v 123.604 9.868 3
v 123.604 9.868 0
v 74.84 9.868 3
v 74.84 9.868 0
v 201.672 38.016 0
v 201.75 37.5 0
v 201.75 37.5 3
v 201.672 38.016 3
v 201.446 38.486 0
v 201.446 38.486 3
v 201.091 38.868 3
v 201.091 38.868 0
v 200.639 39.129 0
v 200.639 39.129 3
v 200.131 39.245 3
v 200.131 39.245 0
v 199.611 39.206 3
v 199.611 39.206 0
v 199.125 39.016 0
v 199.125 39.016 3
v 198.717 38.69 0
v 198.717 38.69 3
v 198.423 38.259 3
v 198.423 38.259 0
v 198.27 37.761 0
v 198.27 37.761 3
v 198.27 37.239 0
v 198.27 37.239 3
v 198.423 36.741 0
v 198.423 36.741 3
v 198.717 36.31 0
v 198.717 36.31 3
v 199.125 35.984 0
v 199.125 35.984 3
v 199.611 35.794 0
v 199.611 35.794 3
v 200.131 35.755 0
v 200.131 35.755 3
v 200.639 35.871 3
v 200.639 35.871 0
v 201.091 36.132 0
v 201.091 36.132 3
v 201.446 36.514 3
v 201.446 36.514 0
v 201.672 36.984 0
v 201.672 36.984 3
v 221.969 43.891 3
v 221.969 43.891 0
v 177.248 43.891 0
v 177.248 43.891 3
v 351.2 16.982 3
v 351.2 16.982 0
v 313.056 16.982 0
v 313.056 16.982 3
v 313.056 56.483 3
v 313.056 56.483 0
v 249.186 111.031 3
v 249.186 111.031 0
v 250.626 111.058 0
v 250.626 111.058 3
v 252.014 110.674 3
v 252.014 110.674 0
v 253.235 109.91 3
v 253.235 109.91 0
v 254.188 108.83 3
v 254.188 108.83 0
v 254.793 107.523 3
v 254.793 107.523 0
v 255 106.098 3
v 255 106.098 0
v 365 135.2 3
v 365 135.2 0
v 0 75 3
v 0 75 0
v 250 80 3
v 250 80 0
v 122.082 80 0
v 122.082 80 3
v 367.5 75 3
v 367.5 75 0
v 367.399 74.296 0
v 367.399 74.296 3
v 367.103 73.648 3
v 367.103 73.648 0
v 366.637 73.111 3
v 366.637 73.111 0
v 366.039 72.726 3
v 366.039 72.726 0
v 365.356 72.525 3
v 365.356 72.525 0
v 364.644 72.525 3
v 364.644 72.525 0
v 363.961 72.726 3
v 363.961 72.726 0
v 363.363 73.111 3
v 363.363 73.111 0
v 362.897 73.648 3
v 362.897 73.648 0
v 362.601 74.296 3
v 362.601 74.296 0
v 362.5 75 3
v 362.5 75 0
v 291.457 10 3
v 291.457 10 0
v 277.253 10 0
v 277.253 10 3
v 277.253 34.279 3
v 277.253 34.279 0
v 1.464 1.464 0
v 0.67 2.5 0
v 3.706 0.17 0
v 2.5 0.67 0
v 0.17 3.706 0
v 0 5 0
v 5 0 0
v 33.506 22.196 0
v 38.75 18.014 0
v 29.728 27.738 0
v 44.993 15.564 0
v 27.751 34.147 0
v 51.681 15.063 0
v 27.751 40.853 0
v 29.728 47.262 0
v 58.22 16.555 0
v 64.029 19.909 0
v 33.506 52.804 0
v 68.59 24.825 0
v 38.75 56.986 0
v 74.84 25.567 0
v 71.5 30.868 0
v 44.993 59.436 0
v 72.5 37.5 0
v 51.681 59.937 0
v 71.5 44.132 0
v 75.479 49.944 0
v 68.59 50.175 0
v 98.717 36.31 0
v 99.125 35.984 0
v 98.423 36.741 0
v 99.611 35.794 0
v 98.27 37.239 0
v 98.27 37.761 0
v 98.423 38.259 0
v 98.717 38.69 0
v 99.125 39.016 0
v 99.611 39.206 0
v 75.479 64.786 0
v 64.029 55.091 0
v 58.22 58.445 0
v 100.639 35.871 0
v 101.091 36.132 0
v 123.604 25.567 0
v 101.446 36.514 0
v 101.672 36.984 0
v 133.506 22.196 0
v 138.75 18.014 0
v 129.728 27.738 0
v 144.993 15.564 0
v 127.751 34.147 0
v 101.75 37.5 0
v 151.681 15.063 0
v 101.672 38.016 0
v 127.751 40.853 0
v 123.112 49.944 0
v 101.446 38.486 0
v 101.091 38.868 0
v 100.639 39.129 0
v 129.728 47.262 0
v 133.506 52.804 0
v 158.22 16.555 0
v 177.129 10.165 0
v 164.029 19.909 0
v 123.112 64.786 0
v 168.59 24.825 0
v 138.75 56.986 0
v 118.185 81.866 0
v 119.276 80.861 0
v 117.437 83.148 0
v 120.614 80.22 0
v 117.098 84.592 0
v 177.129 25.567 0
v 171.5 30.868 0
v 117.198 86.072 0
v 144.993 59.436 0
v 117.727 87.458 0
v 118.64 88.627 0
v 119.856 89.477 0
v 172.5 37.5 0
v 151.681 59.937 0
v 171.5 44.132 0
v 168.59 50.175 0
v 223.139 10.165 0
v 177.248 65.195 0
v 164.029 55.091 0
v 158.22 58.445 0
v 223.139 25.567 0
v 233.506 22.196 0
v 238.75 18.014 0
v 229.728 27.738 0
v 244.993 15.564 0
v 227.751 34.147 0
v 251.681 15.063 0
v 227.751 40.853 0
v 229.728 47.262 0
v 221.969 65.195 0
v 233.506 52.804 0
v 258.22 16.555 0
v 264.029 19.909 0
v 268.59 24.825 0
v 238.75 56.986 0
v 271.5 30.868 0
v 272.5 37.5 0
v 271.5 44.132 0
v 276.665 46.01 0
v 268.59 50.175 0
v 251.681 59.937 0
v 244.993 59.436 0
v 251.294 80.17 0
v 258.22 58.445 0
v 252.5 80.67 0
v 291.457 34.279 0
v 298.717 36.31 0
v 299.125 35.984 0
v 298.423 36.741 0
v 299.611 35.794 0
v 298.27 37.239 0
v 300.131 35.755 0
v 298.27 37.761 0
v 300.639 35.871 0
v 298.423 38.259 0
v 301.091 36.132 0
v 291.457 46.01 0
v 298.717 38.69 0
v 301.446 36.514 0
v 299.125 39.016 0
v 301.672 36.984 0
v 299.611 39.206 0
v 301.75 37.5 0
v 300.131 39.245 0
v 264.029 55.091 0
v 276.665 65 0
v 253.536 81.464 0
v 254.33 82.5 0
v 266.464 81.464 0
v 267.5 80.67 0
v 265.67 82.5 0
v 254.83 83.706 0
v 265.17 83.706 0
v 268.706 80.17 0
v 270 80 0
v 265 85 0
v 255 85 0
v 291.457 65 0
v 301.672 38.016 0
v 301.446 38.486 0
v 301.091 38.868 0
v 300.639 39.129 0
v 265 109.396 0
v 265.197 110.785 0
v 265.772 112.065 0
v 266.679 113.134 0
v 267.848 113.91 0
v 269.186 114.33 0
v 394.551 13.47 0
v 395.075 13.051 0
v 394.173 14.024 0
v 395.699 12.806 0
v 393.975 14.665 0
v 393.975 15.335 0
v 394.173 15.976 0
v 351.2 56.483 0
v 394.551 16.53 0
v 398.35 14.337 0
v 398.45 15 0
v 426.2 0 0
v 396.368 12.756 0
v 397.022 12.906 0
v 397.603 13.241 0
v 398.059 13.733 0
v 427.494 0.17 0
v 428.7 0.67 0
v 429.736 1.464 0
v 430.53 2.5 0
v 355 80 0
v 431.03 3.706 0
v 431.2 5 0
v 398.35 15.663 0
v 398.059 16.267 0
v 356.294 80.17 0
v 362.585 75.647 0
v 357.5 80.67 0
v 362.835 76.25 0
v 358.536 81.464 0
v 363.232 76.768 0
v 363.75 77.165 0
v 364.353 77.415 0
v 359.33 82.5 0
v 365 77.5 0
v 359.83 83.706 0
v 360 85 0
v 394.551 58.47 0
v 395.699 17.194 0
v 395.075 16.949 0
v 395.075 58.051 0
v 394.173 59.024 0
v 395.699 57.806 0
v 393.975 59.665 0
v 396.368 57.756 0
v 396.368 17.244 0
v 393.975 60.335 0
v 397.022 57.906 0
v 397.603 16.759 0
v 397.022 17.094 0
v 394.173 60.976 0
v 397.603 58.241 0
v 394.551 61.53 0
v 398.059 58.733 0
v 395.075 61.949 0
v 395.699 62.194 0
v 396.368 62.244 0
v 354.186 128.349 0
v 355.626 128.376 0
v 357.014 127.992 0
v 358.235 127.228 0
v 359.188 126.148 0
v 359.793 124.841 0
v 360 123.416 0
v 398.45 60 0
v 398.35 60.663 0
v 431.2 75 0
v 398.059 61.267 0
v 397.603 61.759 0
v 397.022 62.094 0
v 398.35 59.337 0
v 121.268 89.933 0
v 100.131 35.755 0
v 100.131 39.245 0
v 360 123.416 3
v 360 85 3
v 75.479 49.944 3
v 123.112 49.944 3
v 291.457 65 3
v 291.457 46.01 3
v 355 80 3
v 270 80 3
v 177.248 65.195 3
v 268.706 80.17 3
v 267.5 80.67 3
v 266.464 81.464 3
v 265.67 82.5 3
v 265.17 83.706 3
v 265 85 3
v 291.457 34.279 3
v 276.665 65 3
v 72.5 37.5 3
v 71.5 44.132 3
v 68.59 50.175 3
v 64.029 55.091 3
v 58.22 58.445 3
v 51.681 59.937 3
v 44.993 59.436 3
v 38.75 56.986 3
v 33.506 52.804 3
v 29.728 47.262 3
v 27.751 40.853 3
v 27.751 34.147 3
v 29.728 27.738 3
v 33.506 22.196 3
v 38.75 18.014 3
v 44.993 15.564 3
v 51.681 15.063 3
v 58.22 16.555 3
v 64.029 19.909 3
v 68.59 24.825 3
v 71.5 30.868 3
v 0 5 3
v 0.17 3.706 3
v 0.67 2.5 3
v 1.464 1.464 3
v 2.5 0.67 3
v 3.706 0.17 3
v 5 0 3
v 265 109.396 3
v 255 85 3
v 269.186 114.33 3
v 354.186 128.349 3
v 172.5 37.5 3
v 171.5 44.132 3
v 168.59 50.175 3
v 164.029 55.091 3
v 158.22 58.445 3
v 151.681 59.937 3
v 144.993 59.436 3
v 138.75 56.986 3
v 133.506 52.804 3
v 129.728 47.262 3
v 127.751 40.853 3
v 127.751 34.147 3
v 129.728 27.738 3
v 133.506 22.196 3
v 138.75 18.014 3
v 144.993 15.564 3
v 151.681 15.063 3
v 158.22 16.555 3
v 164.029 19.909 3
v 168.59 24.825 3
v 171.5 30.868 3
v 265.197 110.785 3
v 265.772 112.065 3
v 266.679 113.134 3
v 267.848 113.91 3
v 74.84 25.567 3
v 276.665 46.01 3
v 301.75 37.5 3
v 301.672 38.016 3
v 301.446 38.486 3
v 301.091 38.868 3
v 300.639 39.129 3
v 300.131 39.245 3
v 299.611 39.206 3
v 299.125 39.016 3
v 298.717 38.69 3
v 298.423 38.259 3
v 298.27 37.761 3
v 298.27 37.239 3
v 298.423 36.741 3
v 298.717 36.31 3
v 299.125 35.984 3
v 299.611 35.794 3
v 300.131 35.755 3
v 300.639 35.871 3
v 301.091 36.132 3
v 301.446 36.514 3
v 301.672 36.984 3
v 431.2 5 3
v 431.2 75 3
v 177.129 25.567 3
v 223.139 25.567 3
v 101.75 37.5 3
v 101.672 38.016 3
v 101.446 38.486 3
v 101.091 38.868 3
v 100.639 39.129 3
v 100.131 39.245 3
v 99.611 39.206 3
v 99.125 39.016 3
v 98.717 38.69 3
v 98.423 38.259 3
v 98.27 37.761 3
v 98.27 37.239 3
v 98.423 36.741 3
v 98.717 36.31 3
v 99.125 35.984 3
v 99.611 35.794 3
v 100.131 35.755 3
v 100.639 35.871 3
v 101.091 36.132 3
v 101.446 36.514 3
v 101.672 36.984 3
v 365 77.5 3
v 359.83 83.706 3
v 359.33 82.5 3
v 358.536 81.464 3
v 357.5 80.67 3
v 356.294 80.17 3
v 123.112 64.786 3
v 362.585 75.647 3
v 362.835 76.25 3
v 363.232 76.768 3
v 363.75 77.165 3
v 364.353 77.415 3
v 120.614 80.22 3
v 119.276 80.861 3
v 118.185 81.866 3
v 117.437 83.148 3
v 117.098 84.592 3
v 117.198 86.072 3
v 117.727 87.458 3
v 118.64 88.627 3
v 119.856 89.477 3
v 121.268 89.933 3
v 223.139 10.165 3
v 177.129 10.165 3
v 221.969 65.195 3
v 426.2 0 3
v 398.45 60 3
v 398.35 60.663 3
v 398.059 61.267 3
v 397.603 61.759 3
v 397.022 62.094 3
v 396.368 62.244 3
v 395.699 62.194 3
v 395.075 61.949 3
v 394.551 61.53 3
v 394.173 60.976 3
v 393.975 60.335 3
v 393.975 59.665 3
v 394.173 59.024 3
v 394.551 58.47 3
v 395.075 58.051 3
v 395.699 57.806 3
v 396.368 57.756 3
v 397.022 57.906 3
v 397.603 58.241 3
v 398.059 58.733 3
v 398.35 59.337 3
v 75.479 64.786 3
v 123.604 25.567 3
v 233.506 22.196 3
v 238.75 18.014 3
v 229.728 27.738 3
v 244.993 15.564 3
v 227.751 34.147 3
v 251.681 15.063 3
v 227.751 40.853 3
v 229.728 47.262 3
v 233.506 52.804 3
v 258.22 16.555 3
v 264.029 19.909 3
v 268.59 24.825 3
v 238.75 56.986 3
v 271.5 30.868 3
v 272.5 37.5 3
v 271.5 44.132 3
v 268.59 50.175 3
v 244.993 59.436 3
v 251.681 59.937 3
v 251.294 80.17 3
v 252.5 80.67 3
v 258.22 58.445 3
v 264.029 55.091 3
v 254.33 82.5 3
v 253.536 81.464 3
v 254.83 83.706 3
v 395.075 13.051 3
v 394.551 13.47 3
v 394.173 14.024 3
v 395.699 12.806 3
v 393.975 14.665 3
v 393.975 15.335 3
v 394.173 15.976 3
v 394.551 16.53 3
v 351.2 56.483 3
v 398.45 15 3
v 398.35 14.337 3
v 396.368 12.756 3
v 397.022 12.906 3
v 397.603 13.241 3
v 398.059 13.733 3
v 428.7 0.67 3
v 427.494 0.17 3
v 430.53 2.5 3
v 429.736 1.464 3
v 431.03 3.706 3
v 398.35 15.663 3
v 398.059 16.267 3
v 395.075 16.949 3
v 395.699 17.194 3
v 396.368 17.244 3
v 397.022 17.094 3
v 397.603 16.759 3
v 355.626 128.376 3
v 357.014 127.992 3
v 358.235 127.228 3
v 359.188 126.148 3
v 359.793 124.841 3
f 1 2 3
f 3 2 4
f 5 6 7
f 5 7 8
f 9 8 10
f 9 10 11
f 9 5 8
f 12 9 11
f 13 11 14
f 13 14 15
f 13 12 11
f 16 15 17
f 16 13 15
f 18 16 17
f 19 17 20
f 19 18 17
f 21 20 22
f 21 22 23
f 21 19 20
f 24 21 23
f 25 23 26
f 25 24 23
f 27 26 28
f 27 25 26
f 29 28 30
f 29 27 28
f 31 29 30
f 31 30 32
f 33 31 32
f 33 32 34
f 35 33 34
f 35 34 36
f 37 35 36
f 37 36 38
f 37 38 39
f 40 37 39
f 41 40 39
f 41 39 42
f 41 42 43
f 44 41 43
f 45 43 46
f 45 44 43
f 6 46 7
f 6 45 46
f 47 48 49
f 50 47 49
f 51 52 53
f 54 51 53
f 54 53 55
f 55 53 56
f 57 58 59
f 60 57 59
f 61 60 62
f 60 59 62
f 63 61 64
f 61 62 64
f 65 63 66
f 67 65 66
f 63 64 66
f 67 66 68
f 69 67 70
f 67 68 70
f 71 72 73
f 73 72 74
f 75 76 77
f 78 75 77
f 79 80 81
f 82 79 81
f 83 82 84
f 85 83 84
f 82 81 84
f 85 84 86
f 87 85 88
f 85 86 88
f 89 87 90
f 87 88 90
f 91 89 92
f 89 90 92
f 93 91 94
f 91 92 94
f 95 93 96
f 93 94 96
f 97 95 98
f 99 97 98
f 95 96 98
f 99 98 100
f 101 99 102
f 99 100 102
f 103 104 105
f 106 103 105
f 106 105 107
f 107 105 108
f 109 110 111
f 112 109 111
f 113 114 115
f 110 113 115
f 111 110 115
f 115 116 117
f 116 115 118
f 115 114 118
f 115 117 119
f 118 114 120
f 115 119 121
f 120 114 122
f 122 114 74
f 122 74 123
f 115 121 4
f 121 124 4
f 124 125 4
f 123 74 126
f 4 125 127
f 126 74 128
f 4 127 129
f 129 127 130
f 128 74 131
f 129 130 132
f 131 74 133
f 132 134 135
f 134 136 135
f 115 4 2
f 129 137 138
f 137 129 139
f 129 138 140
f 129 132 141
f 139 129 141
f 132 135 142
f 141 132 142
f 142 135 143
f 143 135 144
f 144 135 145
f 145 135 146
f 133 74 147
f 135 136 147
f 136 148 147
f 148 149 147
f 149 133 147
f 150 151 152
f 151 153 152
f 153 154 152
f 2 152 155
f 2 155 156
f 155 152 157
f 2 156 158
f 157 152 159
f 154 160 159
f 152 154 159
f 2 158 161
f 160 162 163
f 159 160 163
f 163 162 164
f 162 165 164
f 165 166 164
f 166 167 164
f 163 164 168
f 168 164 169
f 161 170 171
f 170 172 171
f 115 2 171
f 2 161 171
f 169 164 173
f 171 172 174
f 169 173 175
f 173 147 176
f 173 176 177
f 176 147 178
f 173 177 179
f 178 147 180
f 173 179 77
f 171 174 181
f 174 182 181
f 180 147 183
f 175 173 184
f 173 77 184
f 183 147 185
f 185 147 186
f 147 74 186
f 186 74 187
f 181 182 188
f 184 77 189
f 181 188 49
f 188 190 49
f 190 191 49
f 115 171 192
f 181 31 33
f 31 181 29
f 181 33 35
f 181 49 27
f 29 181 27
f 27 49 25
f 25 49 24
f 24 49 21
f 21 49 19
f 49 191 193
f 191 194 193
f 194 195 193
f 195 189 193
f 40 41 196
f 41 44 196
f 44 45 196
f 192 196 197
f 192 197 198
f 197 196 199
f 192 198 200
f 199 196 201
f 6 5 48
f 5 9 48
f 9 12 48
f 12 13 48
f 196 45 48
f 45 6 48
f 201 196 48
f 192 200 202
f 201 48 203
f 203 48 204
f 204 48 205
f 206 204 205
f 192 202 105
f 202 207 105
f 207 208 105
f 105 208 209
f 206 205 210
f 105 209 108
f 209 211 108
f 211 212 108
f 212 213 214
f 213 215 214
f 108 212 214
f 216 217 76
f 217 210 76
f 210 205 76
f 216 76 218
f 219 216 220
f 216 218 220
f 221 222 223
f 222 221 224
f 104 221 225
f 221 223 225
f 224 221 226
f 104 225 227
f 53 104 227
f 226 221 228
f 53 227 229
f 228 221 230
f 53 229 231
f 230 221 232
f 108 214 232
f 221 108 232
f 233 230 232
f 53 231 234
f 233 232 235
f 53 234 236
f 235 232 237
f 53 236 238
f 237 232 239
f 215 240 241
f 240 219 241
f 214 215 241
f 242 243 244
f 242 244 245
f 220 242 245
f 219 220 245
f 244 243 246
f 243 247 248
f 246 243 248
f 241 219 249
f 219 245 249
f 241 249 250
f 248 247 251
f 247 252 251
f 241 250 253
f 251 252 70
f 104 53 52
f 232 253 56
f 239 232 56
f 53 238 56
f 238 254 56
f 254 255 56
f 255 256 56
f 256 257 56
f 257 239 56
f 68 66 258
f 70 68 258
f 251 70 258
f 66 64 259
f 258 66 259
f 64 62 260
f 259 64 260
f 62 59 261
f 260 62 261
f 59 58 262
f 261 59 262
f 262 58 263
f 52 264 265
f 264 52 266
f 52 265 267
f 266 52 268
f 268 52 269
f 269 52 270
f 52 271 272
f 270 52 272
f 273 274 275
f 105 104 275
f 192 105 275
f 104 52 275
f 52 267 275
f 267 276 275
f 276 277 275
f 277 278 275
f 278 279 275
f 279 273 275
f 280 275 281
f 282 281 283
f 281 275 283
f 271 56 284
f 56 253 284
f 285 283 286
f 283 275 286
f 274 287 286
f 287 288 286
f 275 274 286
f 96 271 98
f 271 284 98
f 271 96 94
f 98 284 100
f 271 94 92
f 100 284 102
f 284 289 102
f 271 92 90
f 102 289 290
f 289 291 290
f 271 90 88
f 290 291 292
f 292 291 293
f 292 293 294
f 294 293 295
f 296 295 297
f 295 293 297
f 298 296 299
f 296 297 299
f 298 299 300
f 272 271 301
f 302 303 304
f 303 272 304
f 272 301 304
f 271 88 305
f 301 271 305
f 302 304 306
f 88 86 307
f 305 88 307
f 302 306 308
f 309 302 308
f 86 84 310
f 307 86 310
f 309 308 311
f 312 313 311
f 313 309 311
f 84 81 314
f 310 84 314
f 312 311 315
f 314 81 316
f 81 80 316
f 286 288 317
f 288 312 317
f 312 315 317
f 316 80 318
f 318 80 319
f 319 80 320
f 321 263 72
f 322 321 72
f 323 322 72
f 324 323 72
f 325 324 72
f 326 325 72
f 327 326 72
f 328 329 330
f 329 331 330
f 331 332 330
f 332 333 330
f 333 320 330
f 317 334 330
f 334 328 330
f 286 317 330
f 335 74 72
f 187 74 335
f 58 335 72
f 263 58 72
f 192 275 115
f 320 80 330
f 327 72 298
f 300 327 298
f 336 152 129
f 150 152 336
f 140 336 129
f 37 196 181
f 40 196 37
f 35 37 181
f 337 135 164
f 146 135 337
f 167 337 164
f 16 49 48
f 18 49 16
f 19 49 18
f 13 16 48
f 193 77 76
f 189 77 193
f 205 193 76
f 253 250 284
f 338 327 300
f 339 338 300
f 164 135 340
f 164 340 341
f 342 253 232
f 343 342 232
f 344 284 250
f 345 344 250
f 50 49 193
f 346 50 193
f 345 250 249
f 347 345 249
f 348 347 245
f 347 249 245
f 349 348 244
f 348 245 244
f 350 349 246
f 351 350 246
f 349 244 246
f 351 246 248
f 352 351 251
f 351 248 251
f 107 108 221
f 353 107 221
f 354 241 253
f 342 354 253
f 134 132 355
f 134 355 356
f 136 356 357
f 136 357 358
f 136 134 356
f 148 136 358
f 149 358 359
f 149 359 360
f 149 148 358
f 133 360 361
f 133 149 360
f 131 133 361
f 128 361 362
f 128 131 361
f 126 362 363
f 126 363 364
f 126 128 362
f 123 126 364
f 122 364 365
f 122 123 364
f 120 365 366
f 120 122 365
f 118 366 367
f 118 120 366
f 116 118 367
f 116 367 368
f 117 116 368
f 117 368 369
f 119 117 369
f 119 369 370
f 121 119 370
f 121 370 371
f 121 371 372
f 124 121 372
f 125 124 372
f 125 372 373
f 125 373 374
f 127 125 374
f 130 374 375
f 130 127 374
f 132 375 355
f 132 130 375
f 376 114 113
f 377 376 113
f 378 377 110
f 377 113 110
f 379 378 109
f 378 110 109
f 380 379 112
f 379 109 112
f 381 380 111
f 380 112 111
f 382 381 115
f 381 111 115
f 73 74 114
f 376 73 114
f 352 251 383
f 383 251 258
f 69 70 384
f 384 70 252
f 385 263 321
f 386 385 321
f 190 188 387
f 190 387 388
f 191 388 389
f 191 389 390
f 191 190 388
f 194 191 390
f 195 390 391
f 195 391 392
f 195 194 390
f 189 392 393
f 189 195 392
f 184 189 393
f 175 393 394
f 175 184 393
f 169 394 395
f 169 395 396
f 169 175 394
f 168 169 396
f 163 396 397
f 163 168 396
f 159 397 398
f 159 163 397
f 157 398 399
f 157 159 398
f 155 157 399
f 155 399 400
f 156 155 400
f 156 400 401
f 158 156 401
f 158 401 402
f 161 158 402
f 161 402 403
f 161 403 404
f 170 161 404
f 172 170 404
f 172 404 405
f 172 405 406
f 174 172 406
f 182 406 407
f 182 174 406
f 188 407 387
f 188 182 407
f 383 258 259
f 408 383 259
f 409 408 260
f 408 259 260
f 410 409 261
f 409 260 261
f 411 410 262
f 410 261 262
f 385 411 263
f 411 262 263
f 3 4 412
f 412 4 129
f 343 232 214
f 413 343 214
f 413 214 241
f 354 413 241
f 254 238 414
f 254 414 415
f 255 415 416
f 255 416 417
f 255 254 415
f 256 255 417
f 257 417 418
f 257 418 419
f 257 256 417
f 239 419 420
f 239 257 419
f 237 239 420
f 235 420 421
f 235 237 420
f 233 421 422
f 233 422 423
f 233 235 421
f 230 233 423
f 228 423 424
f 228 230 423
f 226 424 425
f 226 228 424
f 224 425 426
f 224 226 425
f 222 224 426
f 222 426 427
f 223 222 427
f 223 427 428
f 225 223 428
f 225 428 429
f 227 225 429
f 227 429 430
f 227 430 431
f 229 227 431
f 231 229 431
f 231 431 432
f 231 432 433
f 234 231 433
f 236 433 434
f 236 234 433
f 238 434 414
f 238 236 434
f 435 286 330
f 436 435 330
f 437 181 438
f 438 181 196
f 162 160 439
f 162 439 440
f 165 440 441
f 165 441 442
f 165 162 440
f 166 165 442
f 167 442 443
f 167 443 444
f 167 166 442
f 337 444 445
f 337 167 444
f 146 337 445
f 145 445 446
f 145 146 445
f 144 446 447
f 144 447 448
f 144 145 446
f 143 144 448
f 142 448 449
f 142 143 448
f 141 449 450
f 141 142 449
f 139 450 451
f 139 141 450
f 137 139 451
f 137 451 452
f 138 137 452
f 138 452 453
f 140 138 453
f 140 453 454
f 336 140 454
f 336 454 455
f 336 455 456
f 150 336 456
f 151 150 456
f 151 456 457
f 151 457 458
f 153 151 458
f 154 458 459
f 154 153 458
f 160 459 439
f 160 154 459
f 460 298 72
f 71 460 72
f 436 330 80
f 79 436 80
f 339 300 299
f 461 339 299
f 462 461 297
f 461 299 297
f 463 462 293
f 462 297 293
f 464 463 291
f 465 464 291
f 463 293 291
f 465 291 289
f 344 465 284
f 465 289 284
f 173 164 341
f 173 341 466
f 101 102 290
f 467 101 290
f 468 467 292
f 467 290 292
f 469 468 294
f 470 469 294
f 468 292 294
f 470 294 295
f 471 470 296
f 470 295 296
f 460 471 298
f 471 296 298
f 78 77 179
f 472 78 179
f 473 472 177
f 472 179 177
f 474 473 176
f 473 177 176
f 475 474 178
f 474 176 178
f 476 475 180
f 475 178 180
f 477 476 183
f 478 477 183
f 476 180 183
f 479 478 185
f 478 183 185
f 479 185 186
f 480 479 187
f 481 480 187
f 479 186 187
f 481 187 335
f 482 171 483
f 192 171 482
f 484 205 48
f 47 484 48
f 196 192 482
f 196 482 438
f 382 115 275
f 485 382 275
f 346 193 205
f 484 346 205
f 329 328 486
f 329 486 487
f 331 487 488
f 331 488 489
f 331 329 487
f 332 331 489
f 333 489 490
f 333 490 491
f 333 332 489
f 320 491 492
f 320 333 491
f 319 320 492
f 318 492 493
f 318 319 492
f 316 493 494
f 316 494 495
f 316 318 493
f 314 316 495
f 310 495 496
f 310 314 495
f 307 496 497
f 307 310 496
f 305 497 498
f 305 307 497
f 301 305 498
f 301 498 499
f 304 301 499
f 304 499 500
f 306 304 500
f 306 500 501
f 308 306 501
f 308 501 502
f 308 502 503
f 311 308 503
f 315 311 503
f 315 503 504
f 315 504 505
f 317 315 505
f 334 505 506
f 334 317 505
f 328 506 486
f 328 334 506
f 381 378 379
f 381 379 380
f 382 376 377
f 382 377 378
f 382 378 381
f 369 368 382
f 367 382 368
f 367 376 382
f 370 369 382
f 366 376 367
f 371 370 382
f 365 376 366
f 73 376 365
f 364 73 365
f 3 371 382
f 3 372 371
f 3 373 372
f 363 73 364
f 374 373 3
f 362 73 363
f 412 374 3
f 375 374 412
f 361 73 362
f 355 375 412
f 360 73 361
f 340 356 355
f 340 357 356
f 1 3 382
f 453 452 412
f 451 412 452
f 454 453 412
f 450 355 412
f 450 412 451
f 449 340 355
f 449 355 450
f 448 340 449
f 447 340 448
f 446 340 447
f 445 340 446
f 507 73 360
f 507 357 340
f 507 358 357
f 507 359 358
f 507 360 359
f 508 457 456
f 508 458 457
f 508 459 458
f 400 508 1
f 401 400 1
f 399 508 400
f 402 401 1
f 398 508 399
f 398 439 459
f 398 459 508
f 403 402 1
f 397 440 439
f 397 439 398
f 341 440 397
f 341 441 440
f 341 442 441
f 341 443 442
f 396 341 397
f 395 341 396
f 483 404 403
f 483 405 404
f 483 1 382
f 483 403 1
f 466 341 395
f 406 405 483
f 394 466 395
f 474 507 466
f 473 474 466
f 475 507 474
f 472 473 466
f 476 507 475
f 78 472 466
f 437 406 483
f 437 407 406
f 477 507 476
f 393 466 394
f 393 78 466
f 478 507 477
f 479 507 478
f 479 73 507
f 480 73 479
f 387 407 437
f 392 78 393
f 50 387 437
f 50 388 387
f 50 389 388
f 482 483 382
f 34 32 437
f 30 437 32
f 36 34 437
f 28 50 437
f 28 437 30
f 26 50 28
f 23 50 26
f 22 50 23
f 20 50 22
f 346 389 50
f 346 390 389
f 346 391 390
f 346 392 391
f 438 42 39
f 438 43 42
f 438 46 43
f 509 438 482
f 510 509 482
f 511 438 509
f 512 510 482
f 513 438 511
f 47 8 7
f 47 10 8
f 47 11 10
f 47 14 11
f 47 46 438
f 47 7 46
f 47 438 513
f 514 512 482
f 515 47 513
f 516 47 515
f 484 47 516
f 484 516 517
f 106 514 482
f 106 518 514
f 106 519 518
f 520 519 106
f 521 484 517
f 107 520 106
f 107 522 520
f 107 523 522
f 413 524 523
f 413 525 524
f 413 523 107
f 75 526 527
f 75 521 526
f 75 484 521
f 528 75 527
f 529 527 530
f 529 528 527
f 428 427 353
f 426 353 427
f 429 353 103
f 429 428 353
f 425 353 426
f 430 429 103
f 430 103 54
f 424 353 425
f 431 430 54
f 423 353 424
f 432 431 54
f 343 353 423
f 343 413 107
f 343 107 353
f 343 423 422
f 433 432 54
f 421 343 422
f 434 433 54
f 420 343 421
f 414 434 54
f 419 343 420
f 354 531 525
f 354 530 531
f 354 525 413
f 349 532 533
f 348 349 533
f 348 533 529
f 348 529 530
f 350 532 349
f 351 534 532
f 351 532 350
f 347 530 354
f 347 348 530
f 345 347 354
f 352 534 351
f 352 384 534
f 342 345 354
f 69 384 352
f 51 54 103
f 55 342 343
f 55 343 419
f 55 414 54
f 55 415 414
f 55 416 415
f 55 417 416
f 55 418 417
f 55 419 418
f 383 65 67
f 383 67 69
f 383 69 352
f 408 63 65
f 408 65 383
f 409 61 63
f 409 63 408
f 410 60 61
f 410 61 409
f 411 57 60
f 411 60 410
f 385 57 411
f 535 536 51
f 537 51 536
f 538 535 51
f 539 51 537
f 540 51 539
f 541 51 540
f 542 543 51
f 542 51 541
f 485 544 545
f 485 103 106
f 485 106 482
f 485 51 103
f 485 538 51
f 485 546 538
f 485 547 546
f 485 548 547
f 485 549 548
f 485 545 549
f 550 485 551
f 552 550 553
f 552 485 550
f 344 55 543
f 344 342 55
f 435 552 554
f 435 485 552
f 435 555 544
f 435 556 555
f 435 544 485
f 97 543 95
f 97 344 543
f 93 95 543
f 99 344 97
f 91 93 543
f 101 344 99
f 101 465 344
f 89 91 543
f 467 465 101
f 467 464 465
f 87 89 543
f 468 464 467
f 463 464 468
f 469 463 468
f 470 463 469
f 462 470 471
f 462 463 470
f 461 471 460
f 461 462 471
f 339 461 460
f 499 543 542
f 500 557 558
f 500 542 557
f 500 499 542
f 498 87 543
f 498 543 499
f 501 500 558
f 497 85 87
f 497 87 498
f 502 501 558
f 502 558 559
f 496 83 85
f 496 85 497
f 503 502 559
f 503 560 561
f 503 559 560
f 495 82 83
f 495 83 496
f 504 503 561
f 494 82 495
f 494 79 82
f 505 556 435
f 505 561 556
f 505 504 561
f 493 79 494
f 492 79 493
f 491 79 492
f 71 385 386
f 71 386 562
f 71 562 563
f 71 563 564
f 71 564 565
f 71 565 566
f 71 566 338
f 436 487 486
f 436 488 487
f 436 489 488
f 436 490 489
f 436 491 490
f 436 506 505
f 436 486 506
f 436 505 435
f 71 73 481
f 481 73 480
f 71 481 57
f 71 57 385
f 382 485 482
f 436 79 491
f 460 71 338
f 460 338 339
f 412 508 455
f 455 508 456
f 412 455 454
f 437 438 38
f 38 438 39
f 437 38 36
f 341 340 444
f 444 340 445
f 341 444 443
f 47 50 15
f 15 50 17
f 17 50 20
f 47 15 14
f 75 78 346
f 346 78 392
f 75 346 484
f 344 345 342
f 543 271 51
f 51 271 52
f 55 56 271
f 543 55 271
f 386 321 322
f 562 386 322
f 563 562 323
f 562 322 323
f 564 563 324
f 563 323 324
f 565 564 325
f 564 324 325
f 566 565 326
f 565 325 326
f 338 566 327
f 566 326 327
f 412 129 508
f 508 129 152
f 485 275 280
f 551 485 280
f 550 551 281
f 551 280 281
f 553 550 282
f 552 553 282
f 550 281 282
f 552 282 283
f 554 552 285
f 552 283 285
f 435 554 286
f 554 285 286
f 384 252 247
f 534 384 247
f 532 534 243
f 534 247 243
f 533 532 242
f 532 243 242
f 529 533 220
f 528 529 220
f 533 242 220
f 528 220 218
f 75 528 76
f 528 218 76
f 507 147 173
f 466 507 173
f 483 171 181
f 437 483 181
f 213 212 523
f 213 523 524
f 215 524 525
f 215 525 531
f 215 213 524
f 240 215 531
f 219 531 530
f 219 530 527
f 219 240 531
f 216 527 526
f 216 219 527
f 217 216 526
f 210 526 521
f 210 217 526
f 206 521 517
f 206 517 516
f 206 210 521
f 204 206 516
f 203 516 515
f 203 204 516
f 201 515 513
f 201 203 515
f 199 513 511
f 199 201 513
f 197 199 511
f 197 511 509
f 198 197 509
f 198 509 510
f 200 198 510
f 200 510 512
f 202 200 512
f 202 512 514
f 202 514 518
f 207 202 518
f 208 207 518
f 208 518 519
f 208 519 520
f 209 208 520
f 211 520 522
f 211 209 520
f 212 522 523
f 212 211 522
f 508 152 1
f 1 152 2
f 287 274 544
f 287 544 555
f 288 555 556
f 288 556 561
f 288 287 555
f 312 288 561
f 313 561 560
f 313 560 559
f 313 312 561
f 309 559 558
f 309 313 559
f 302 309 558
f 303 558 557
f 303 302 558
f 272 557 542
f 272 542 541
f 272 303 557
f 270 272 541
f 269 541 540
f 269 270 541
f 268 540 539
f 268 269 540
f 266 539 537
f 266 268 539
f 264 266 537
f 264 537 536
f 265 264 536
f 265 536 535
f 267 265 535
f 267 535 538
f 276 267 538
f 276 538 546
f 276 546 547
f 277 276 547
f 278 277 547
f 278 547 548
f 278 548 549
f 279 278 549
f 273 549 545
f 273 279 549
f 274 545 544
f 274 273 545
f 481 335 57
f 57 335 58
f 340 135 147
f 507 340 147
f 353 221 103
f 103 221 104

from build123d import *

# Parameters (mm, degrees)
F0_R     = 2.25
F0_W     = 46.010702
F0_H     = 15.40207
F0_R_2   = 22.5
F0_R_3   = 1.75
F0_W_2   = 47.632419
F0_H_2   = 14.842443
F1_DEPTH = 3


with BuildPart() as f1:
    # F0 (on Top) → F1 (new body)
    with BuildSketch(Plane.XY):
        with BuildLine():
            Line((365, 135.2), (0, 75))
            Line((0, 75), (362.5, 75))
            ThreePointArc((362.5, 75), (363.232233, 76.767767), (365, 77.5))
            Line((365, 77.5), (365, 135.2))
        make_face()
        with BuildLine():
            Line((249.999995, 79.999998), (122.081561, 79.999998))
            ThreePointArc((122.081561, 79.999998), (117.098251, 84.591803), (121.267896, 89.933349))
            Line((121.267896, 89.933349), (249.18633, 111.031129))
            ThreePointArc((249.18633, 111.031129), (253.23509, 109.910148), (254.999995, 106.097778))
            Line((254.999995, 106.097778), (254.999995, 84.999998))
            ThreePointArc((254.999995, 84.999998), (253.535529, 81.464464), (249.999995, 79.999998))
        make_face(mode=Mode.SUBTRACT)
        with BuildLine():
            ThreePointArc((354.186335, 128.348938), (358.235095, 127.227957), (360, 123.415587))
            Line((360, 123.415587), (360, 84.999998))
            ThreePointArc((360, 84.999998), (358.535534, 81.464464), (355, 79.999998))
            Line((355, 79.999998), (270, 79.999998))
            ThreePointArc((270, 79.999998), (266.464466, 81.464464), (265, 84.999998))
            Line((265, 84.999998), (265, 109.396409))
            ThreePointArc((265, 109.396409), (266.18763, 112.631504), (269.186335, 114.32976))
            Line((269.186335, 114.32976), (354.186335, 128.348938))
        make_face(mode=Mode.SUBTRACT)
        with BuildLine():
            ThreePointArc((0, 5), (1.464466, 1.464466), (5, 0))
            Line((5, 0), (426.2, 0))
            ThreePointArc((426.2, 0), (429.735534, 1.464466), (431.2, 5))
            Line((431.2, 5), (431.2, 75))
            Line((431.2, 75), (367.5, 75))
            ThreePointArc((367.5, 75), (365, 72.5), (362.5, 75))
            Line((362.5, 75), (0, 75))
            Line((0, 75), (0, 5))
        make_face()
        with BuildLine():
            ThreePointArc((15, 10), (11.464466, 11.464466), (10, 15))
            Line((10, 15), (10, 60))
            ThreePointArc((10, 60), (11.464466, 63.535534), (15, 65))
            Line((15, 65), (177.248031, 65))
            Line((177.248031, 65), (177.248031, 65.195423))
            Line((177.248031, 65.195423), (221.969068, 65.195423))
            Line((221.969068, 65.195423), (221.969068, 65))
            Line((221.969068, 65), (276.665121, 65))
            Line((276.665121, 65), (291.45667, 65))
            Line((291.45667, 65), (346.2, 65))
            ThreePointArc((346.2, 65), (349.735534, 63.535534), (351.2, 60))
            Line((351.2, 60), (351.2, 56.482751))
            Line((351.2, 56.482751), (351.2, 16.981905))
            Line((351.2, 16.981905), (351.2, 15))
            ThreePointArc((351.2, 15), (349.735534, 11.464466), (346.2, 10))
            Line((346.2, 10), (291.45667, 10))
            Line((291.45667, 10), (277.253091, 10))
            Line((277.253091, 10), (123.603888, 10))
            Line((123.603888, 10), (123.603888, 9.868093))
            Line((123.603888, 9.868093), (74.839681, 9.868093))
            Line((74.839681, 9.868093), (74.839681, 10))
            Line((74.839681, 10), (15, 10))
        make_face(mode=Mode.SUBTRACT)
        with Locations((396.2, 15)):
            Circle(F0_R, mode=Mode.SUBTRACT)
        with Locations((396.2, 60)):
            Circle(F0_R, mode=Mode.SUBTRACT)
        with BuildLine():
            Line((10, 60), (10, 15))
            ThreePointArc((10, 15), (11.464466, 11.464466), (15, 10))
            Line((15, 10), (74.839681, 10))
            Line((74.839681, 10), (74.839681, 25.567258))
            Line((74.839681, 25.567258), (123.603888, 25.567258))
            Line((123.603888, 25.567258), (123.603888, 10))
            Line((123.603888, 10), (277.253091, 10))
            Line((277.253091, 10), (277.253091, 34.278966))
            Line((277.253091, 34.278966), (291.45667, 34.278966))
            Line((291.45667, 34.278966), (291.45667, 10))
            Line((291.45667, 10), (346.2, 10))
            ThreePointArc((346.2, 10), (349.735534, 11.464466), (351.2, 15))
            Line((351.2, 15), (351.2, 16.981905))
            Line((351.2, 16.981905), (313.055903, 16.981905))
            Line((313.055903, 16.981905), (313.055903, 56.482751))
            Line((313.055903, 56.482751), (351.2, 56.482751))
            Line((351.2, 56.482751), (351.2, 60))
            ThreePointArc((351.2, 60), (349.735534, 63.535534), (346.2, 65))
            Line((346.2, 65), (291.45667, 65))
            Line((291.45667, 65), (291.45667, 46.009973))
            Line((291.45667, 46.009973), (276.665121, 46.009973))
            Line((276.665121, 46.009973), (276.665121, 65))
            Line((276.665121, 65), (221.969068, 65))
            Line((221.969068, 65), (221.969068, 43.890707))
            Line((221.969068, 43.890707), (177.248031, 43.890707))
            Line((177.248031, 43.890707), (177.248031, 65))
            Line((177.248031, 65), (15, 65))
            ThreePointArc((15, 65), (11.464466, 63.535534), (10, 60))
        make_face()
        with Locations((200.134024, 17.866223)):
            Rectangle(F0_W, F0_H, mode=Mode.SUBTRACT)
        with Locations((50, 37.5)):
            Circle(F0_R_2, mode=Mode.SUBTRACT)
        with Locations((100, 37.5)):
            Circle(F0_R_3, mode=Mode.SUBTRACT)
        with Locations((99.295299, 57.364914)):
            Rectangle(F0_W_2, F0_H_2, mode=Mode.SUBTRACT)
        with Locations((150, 37.5)):
            Circle(F0_R_2, mode=Mode.SUBTRACT)
        with Locations((200, 37.5)):
            Circle(F0_R_3, mode=Mode.SUBTRACT)
        with Locations((250, 37.5)):
            Circle(F0_R_2, mode=Mode.SUBTRACT)
        with Locations((300, 37.5)):
            Circle(F0_R_3, mode=Mode.SUBTRACT)
    extrude(amount=F1_DEPTH)


solid = f1.part
